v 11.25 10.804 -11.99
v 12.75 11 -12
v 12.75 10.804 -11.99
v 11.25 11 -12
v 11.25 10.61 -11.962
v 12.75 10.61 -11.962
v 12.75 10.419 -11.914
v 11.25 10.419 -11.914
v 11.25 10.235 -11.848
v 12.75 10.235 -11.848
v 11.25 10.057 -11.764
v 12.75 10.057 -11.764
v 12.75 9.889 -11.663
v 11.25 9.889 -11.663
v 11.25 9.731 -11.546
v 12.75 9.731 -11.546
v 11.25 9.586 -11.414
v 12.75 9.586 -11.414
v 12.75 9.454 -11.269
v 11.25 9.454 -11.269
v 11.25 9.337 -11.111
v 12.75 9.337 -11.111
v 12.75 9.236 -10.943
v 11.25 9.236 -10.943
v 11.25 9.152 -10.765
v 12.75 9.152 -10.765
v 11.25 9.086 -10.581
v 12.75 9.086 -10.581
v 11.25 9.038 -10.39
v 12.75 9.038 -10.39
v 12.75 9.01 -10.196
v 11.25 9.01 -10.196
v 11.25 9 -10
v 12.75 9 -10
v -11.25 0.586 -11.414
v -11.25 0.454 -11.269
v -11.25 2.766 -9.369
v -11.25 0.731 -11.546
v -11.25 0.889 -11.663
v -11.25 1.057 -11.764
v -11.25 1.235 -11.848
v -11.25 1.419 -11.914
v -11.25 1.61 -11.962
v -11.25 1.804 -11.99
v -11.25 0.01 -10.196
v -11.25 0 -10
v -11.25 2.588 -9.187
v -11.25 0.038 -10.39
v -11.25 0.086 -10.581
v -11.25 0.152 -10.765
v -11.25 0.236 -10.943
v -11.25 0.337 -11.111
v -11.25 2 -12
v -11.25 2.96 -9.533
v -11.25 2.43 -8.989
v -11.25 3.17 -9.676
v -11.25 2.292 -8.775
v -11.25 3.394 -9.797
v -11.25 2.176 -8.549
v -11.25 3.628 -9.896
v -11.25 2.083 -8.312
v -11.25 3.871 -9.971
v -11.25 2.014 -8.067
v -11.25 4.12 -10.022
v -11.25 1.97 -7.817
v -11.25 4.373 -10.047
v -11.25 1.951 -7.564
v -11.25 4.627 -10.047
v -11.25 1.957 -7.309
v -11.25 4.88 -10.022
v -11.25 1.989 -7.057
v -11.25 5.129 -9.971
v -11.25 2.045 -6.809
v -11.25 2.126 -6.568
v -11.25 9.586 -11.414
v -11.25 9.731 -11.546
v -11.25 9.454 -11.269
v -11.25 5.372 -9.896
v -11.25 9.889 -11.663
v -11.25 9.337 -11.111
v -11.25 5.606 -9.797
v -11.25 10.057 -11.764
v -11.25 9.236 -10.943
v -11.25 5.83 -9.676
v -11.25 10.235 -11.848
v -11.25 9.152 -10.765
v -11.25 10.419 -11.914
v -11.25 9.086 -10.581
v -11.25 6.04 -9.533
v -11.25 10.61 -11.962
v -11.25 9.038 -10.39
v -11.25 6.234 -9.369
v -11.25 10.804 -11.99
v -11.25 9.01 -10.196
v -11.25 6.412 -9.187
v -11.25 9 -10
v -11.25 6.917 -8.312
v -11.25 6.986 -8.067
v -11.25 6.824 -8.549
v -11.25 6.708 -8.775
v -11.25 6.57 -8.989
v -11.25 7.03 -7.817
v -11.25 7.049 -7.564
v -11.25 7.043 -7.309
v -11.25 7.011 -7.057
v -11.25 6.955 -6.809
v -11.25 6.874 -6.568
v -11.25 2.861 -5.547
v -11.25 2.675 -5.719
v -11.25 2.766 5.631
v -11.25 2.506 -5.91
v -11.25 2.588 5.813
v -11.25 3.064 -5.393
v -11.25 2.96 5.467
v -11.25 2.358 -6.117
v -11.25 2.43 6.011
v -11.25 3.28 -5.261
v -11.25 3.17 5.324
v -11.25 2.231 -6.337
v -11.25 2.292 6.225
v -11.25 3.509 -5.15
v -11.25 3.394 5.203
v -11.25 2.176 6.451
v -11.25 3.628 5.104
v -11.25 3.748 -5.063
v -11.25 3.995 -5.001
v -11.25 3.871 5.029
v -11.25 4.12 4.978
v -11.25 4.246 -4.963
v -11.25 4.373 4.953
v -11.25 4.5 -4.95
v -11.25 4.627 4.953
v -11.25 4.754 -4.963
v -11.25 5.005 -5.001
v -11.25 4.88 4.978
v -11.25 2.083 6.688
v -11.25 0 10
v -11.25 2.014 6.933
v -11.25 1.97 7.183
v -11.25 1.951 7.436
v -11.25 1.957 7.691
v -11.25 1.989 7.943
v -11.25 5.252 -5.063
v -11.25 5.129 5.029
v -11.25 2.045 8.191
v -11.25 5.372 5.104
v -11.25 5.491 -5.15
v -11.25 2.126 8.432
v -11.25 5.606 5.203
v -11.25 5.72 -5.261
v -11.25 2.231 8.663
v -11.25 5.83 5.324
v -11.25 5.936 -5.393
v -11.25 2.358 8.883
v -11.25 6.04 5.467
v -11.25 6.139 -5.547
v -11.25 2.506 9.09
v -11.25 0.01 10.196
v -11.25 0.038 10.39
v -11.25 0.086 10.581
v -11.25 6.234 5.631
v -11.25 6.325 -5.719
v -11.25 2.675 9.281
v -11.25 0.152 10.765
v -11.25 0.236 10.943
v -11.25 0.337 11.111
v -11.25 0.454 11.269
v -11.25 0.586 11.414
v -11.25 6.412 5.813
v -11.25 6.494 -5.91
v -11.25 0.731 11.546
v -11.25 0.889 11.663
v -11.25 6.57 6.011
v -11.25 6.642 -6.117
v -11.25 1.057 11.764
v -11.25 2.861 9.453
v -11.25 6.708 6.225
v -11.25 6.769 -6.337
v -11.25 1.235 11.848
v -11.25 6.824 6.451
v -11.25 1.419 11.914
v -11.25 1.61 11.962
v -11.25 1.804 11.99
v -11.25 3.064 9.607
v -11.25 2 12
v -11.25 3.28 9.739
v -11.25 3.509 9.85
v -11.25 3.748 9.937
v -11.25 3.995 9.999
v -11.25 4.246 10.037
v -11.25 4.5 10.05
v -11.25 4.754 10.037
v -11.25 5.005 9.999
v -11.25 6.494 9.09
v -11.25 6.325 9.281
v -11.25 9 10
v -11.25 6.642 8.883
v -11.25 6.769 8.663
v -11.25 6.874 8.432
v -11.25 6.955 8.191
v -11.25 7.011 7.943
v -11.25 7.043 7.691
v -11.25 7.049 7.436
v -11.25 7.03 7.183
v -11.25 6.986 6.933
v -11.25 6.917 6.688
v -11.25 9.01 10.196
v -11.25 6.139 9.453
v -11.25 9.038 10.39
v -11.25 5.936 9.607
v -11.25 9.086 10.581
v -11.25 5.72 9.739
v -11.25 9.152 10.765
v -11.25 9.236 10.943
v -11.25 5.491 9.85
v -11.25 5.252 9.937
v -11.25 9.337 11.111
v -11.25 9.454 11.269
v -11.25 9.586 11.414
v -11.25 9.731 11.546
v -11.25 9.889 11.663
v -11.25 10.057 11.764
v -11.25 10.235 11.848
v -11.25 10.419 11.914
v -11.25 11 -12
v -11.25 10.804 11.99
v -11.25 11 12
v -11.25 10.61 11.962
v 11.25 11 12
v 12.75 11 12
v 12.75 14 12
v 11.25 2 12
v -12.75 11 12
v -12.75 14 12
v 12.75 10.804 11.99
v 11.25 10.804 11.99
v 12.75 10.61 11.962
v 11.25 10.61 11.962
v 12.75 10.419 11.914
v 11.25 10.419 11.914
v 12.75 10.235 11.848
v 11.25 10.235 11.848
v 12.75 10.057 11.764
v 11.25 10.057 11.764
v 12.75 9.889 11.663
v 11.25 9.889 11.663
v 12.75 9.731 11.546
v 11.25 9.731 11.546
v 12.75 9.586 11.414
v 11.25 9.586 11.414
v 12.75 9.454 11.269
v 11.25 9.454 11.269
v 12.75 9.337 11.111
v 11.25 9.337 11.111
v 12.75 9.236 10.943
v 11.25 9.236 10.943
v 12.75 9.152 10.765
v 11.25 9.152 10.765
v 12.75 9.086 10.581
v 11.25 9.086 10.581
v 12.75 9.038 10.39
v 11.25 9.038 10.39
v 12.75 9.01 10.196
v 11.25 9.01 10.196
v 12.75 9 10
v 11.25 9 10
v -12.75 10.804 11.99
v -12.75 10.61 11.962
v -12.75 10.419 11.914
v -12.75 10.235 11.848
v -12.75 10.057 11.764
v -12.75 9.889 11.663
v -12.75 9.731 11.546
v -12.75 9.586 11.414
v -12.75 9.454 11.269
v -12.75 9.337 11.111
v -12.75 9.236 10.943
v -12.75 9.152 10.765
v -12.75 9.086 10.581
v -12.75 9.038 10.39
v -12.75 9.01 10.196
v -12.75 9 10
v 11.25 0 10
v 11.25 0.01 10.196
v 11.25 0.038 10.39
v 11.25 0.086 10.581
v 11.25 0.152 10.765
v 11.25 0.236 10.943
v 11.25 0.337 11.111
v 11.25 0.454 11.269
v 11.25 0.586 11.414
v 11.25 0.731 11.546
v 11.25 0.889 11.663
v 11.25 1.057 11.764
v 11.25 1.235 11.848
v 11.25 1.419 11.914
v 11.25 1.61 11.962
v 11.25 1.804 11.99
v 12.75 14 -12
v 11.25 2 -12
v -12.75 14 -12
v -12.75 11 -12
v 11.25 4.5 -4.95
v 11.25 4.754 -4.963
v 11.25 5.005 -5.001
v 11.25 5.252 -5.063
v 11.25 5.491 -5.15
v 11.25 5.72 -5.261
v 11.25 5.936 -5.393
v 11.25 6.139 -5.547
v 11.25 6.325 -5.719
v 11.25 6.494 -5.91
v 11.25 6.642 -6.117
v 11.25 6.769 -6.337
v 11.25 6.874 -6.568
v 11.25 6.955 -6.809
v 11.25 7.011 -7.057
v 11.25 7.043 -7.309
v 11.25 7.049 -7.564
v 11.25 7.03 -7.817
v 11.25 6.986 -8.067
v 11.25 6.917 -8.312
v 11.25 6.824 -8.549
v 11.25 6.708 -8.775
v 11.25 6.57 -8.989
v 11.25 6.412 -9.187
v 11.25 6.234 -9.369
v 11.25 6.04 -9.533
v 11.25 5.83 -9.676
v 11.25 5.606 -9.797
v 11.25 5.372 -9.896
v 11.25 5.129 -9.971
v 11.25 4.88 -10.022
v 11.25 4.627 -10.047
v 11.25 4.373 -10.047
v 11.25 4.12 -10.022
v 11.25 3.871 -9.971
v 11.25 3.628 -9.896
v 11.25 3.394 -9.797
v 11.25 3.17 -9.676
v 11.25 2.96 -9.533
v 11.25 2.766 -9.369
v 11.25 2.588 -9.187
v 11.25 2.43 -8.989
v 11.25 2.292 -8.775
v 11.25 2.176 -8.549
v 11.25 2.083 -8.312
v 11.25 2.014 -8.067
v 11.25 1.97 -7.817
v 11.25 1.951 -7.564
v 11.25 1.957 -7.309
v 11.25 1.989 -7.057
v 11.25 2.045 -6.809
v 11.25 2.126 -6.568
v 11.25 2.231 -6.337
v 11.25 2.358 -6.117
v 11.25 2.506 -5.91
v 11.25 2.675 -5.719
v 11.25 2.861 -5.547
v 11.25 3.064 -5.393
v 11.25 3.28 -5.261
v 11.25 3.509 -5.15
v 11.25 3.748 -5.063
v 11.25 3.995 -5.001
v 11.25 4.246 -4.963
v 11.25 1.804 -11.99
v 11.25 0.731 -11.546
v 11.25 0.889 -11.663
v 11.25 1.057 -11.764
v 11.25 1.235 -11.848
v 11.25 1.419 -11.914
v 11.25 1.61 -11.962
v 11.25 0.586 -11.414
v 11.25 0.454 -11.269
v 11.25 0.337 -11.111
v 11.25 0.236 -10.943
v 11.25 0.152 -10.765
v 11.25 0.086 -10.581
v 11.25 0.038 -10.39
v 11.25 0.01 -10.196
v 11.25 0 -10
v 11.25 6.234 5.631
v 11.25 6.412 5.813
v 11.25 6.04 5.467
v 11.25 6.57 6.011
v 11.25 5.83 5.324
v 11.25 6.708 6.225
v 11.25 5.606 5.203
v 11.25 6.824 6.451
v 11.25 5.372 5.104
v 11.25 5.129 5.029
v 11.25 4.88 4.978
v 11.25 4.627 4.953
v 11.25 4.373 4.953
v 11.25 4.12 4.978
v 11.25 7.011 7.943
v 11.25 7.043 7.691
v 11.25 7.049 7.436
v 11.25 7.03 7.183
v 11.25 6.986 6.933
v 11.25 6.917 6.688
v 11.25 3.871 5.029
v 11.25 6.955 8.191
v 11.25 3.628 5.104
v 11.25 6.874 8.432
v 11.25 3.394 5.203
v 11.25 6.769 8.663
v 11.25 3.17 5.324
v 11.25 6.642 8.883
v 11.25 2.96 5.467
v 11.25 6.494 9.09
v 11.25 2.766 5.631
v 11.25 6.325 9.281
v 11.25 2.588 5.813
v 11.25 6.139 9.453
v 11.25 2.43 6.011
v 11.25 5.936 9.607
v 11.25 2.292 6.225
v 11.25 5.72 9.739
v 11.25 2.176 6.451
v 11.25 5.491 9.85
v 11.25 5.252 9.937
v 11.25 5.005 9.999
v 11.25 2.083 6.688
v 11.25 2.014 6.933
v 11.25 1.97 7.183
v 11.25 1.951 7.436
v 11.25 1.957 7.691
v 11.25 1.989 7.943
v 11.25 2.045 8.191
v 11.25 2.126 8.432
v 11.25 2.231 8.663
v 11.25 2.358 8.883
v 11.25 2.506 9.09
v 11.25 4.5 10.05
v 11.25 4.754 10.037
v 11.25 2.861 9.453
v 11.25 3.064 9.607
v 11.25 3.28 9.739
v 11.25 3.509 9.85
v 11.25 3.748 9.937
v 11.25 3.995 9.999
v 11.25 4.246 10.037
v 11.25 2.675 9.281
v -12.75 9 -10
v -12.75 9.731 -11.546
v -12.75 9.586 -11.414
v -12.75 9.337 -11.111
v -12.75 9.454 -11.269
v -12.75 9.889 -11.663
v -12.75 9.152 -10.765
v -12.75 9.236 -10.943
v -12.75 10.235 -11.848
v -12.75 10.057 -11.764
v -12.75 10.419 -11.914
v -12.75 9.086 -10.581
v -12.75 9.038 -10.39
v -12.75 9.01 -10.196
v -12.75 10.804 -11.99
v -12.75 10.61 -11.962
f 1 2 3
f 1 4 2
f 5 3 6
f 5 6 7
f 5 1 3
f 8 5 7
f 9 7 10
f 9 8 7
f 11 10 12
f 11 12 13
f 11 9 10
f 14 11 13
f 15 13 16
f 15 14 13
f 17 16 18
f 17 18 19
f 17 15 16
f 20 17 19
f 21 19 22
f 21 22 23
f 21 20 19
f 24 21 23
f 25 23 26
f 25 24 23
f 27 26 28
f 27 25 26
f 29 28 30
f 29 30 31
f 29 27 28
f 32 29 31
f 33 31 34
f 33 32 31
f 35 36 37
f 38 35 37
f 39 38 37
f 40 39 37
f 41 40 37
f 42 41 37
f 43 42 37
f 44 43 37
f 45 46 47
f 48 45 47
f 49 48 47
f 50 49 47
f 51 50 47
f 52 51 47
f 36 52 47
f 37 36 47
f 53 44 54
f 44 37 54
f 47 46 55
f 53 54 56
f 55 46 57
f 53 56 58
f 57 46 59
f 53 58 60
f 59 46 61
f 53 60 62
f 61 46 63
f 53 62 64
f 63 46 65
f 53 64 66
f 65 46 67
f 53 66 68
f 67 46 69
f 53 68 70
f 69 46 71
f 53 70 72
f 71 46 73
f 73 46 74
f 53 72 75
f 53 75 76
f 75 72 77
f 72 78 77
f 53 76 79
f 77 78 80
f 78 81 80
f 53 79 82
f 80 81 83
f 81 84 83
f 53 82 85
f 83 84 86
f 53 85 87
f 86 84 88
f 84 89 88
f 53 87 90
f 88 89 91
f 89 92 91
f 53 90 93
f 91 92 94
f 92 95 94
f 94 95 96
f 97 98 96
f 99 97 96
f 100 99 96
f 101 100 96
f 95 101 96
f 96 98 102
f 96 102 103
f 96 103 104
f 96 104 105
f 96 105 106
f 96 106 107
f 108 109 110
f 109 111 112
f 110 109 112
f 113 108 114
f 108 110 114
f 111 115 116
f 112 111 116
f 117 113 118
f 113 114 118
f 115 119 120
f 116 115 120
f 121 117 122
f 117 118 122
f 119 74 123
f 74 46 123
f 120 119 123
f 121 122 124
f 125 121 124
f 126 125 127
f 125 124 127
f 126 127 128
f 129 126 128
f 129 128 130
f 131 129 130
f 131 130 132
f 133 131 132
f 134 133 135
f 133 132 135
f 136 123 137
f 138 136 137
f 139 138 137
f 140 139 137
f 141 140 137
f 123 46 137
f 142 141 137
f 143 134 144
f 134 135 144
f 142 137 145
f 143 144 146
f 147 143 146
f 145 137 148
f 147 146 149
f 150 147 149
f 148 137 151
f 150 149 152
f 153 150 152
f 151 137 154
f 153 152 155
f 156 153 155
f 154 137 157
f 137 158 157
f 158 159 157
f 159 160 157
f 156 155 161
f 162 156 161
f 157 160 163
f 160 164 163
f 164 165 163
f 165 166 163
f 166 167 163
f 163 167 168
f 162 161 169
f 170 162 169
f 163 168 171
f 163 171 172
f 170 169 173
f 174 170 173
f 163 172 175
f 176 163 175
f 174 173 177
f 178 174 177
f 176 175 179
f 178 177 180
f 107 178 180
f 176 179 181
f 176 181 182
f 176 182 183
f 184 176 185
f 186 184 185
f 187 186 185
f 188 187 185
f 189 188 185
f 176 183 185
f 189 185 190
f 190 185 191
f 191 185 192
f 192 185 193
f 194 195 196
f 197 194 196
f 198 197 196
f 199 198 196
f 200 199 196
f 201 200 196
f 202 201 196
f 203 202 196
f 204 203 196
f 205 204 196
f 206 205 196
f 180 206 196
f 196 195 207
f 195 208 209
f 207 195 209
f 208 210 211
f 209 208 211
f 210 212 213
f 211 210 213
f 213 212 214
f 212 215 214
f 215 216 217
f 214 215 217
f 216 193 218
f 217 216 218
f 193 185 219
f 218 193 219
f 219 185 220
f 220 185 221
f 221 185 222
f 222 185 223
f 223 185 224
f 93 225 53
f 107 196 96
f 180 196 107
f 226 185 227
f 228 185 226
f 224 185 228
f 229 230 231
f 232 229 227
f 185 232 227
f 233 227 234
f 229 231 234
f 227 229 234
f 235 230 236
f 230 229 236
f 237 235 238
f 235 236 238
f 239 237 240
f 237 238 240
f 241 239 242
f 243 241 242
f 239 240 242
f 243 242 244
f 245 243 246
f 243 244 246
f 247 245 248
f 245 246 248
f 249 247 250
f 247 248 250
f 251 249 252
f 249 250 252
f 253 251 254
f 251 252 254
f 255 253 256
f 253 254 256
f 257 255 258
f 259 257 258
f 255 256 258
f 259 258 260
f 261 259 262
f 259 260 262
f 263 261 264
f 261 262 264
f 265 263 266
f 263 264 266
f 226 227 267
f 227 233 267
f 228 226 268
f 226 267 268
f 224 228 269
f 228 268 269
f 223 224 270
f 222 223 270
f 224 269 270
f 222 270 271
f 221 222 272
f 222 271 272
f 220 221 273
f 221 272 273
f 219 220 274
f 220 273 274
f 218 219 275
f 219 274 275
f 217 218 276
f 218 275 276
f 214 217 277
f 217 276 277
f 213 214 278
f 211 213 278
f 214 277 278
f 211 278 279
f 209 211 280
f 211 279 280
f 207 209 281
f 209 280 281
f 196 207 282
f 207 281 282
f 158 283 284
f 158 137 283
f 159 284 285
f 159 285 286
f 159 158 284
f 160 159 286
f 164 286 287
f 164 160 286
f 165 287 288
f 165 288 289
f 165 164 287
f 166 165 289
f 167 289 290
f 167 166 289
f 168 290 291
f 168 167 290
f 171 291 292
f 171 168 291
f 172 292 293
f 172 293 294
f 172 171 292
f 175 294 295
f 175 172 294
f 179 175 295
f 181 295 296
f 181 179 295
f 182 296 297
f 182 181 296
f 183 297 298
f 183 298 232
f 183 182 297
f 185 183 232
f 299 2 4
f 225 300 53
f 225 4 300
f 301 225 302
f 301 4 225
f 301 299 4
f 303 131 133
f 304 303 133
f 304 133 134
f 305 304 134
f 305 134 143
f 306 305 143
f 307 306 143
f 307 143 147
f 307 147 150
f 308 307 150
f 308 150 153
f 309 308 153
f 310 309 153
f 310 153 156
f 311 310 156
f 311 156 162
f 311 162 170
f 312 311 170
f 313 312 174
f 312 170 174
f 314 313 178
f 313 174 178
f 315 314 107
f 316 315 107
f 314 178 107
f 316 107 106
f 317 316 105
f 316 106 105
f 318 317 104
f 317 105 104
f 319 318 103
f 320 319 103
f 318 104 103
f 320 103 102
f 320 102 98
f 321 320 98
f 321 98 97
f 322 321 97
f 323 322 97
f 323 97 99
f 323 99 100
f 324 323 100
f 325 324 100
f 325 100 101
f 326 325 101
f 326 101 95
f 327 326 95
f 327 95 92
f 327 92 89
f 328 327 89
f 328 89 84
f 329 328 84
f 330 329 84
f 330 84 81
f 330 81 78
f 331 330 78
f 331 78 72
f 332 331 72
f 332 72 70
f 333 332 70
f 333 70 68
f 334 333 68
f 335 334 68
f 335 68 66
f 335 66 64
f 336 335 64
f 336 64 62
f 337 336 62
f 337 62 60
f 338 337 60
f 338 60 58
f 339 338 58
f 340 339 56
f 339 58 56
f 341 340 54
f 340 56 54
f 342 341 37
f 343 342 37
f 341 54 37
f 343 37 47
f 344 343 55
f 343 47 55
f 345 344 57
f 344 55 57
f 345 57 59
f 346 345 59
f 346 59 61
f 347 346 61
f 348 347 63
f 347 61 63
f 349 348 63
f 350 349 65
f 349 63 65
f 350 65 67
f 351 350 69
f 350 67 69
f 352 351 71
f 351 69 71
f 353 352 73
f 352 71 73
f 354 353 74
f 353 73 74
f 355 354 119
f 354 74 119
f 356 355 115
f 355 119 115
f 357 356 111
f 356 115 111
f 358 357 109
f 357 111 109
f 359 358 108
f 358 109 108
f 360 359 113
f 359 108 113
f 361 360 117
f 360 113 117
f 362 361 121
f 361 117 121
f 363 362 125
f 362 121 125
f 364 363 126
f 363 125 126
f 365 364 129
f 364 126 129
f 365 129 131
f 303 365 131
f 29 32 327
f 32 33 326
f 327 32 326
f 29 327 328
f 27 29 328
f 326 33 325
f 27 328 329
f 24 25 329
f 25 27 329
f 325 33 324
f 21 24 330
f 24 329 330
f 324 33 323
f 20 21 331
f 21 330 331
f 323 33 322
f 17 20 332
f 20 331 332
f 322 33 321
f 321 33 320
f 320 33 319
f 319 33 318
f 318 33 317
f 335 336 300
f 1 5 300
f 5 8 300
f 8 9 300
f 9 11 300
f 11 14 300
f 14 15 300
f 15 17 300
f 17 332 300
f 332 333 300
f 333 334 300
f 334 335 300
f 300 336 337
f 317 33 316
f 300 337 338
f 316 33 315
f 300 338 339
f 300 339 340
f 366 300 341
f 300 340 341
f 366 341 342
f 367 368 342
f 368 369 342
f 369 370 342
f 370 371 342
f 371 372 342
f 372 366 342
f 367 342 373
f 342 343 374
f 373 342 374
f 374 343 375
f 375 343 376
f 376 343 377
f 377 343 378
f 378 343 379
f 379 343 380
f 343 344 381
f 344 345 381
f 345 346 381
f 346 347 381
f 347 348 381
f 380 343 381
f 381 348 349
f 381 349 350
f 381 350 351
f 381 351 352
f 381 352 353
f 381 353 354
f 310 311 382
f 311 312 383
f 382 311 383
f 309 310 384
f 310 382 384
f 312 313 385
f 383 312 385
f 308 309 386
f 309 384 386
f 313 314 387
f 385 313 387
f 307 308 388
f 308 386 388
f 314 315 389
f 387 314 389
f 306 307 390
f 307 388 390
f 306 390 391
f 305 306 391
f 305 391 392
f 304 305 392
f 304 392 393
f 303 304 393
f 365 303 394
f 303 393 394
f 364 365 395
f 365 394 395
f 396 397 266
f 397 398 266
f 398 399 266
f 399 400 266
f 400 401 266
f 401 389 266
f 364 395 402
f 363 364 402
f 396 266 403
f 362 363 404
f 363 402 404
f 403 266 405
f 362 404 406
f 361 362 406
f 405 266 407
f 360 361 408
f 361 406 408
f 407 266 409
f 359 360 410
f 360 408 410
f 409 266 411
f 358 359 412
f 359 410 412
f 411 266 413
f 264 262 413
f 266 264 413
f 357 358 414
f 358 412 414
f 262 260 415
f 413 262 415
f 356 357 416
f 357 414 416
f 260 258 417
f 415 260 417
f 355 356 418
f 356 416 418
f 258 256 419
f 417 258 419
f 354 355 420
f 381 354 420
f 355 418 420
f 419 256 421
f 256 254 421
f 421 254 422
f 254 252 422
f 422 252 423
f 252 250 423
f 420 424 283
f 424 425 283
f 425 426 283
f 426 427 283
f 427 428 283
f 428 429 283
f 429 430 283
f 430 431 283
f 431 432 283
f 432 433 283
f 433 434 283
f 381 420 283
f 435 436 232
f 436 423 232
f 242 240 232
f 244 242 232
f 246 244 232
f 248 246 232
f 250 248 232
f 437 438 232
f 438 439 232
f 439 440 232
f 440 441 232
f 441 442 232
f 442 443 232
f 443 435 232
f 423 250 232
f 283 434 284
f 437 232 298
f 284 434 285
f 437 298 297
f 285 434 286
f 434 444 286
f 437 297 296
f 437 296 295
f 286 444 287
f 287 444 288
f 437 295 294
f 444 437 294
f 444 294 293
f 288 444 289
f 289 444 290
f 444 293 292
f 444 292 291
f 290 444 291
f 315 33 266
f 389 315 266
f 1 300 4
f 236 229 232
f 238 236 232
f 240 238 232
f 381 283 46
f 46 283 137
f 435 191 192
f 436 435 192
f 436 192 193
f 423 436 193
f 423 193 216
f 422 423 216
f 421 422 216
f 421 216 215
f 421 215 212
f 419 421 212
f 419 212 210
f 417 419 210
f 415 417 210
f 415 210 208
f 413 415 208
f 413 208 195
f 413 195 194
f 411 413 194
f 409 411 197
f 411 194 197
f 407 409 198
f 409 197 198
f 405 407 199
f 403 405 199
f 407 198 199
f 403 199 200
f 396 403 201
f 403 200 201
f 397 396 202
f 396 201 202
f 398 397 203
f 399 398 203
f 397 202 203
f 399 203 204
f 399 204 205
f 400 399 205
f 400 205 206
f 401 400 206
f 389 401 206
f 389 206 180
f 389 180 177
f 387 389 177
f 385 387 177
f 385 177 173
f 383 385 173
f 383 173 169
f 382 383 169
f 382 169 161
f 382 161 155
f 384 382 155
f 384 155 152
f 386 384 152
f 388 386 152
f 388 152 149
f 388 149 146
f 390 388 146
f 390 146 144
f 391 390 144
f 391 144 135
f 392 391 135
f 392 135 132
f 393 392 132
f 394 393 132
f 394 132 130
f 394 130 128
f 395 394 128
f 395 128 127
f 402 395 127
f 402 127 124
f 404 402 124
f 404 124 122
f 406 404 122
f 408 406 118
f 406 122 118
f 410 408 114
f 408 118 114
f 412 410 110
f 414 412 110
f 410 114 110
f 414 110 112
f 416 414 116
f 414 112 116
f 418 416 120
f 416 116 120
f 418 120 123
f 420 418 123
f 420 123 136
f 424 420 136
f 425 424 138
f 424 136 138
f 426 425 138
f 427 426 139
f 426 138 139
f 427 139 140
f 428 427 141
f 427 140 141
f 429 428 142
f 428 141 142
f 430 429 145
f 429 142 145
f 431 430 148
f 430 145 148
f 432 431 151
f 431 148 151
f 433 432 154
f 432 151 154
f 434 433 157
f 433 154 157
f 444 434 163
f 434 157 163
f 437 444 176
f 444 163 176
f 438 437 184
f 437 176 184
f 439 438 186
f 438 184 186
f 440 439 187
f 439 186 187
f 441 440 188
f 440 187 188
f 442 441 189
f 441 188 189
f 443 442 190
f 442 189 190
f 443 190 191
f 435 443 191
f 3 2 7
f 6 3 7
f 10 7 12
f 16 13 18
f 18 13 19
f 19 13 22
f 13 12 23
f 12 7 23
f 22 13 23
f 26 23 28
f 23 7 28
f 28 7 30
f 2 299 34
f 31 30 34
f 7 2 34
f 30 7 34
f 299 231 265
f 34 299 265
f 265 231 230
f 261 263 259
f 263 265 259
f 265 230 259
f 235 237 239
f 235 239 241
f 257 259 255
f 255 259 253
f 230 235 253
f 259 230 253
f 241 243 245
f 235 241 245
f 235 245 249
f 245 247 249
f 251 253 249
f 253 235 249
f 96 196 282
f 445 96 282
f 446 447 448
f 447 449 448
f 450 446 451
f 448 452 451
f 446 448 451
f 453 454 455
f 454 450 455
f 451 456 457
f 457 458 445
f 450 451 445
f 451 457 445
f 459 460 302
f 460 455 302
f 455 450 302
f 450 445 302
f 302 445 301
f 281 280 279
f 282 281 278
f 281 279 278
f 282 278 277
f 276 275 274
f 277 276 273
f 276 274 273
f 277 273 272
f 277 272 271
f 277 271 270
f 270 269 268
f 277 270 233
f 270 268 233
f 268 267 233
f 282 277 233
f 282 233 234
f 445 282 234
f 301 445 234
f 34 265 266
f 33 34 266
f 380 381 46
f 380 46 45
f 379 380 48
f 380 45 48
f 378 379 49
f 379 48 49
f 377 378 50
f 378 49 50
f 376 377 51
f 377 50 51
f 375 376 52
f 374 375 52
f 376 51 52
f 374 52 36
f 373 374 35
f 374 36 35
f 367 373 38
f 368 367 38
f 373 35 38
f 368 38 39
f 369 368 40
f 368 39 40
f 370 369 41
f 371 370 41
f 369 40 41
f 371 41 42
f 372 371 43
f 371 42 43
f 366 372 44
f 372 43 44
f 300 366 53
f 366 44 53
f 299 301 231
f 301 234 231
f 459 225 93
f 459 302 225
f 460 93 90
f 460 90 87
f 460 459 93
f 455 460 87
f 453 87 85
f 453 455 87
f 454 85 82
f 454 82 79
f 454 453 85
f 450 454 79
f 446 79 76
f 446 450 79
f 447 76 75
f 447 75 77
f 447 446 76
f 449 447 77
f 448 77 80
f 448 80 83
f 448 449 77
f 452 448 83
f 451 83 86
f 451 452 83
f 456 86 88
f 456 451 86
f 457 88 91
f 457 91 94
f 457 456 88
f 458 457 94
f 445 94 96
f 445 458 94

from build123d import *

# Parameters (mm, degrees)
MAIN_BODY_DEPTH            = 12
SKETCH2_R                  = 2.55
CLEARANCE_M3_INSERTS_DEPTH = 25
CONTOURING_R               = 2


with BuildPart() as part:
    # Sketch1 → Main Body (new body, symmetric)
    with BuildSketch(Plane.XY):
        Polygon((11.25, 0), (-11.25, 0), (-11.25, 9), (-12.75, 9), (-12.75, 14), (12.75, 14), (12.75, 9), (11.25, 9), align=None)
    extrude(amount=MAIN_BODY_DEPTH, both=True)

    # Sketch2 → Clearance - M3 Inserts (cut, through all)
    with BuildSketch(Plane.ZY.offset(11.25)):
        with Locations((-7.5, 4.5)):
            Circle(SKETCH2_R)
        with Locations((7.5, 4.5)):
            Circle(SKETCH2_R)
    extrude(amount=-CLEARANCE_M3_INSERTS_DEPTH, mode=Mode.SUBTRACT)

    # Contouring
    contouring_edges = [part.edges().sort_by_distance(p)[0] for p in [
        (12, 9, -12),
        (-12, 9, 12),
        (0, 0, 12),
        (12, 9, 12),
        (0, 0, -12),
        (-12, 9, -12),
    ]]
    fillet(contouring_edges, radius=CONTOURING_R)


solid = part.part
